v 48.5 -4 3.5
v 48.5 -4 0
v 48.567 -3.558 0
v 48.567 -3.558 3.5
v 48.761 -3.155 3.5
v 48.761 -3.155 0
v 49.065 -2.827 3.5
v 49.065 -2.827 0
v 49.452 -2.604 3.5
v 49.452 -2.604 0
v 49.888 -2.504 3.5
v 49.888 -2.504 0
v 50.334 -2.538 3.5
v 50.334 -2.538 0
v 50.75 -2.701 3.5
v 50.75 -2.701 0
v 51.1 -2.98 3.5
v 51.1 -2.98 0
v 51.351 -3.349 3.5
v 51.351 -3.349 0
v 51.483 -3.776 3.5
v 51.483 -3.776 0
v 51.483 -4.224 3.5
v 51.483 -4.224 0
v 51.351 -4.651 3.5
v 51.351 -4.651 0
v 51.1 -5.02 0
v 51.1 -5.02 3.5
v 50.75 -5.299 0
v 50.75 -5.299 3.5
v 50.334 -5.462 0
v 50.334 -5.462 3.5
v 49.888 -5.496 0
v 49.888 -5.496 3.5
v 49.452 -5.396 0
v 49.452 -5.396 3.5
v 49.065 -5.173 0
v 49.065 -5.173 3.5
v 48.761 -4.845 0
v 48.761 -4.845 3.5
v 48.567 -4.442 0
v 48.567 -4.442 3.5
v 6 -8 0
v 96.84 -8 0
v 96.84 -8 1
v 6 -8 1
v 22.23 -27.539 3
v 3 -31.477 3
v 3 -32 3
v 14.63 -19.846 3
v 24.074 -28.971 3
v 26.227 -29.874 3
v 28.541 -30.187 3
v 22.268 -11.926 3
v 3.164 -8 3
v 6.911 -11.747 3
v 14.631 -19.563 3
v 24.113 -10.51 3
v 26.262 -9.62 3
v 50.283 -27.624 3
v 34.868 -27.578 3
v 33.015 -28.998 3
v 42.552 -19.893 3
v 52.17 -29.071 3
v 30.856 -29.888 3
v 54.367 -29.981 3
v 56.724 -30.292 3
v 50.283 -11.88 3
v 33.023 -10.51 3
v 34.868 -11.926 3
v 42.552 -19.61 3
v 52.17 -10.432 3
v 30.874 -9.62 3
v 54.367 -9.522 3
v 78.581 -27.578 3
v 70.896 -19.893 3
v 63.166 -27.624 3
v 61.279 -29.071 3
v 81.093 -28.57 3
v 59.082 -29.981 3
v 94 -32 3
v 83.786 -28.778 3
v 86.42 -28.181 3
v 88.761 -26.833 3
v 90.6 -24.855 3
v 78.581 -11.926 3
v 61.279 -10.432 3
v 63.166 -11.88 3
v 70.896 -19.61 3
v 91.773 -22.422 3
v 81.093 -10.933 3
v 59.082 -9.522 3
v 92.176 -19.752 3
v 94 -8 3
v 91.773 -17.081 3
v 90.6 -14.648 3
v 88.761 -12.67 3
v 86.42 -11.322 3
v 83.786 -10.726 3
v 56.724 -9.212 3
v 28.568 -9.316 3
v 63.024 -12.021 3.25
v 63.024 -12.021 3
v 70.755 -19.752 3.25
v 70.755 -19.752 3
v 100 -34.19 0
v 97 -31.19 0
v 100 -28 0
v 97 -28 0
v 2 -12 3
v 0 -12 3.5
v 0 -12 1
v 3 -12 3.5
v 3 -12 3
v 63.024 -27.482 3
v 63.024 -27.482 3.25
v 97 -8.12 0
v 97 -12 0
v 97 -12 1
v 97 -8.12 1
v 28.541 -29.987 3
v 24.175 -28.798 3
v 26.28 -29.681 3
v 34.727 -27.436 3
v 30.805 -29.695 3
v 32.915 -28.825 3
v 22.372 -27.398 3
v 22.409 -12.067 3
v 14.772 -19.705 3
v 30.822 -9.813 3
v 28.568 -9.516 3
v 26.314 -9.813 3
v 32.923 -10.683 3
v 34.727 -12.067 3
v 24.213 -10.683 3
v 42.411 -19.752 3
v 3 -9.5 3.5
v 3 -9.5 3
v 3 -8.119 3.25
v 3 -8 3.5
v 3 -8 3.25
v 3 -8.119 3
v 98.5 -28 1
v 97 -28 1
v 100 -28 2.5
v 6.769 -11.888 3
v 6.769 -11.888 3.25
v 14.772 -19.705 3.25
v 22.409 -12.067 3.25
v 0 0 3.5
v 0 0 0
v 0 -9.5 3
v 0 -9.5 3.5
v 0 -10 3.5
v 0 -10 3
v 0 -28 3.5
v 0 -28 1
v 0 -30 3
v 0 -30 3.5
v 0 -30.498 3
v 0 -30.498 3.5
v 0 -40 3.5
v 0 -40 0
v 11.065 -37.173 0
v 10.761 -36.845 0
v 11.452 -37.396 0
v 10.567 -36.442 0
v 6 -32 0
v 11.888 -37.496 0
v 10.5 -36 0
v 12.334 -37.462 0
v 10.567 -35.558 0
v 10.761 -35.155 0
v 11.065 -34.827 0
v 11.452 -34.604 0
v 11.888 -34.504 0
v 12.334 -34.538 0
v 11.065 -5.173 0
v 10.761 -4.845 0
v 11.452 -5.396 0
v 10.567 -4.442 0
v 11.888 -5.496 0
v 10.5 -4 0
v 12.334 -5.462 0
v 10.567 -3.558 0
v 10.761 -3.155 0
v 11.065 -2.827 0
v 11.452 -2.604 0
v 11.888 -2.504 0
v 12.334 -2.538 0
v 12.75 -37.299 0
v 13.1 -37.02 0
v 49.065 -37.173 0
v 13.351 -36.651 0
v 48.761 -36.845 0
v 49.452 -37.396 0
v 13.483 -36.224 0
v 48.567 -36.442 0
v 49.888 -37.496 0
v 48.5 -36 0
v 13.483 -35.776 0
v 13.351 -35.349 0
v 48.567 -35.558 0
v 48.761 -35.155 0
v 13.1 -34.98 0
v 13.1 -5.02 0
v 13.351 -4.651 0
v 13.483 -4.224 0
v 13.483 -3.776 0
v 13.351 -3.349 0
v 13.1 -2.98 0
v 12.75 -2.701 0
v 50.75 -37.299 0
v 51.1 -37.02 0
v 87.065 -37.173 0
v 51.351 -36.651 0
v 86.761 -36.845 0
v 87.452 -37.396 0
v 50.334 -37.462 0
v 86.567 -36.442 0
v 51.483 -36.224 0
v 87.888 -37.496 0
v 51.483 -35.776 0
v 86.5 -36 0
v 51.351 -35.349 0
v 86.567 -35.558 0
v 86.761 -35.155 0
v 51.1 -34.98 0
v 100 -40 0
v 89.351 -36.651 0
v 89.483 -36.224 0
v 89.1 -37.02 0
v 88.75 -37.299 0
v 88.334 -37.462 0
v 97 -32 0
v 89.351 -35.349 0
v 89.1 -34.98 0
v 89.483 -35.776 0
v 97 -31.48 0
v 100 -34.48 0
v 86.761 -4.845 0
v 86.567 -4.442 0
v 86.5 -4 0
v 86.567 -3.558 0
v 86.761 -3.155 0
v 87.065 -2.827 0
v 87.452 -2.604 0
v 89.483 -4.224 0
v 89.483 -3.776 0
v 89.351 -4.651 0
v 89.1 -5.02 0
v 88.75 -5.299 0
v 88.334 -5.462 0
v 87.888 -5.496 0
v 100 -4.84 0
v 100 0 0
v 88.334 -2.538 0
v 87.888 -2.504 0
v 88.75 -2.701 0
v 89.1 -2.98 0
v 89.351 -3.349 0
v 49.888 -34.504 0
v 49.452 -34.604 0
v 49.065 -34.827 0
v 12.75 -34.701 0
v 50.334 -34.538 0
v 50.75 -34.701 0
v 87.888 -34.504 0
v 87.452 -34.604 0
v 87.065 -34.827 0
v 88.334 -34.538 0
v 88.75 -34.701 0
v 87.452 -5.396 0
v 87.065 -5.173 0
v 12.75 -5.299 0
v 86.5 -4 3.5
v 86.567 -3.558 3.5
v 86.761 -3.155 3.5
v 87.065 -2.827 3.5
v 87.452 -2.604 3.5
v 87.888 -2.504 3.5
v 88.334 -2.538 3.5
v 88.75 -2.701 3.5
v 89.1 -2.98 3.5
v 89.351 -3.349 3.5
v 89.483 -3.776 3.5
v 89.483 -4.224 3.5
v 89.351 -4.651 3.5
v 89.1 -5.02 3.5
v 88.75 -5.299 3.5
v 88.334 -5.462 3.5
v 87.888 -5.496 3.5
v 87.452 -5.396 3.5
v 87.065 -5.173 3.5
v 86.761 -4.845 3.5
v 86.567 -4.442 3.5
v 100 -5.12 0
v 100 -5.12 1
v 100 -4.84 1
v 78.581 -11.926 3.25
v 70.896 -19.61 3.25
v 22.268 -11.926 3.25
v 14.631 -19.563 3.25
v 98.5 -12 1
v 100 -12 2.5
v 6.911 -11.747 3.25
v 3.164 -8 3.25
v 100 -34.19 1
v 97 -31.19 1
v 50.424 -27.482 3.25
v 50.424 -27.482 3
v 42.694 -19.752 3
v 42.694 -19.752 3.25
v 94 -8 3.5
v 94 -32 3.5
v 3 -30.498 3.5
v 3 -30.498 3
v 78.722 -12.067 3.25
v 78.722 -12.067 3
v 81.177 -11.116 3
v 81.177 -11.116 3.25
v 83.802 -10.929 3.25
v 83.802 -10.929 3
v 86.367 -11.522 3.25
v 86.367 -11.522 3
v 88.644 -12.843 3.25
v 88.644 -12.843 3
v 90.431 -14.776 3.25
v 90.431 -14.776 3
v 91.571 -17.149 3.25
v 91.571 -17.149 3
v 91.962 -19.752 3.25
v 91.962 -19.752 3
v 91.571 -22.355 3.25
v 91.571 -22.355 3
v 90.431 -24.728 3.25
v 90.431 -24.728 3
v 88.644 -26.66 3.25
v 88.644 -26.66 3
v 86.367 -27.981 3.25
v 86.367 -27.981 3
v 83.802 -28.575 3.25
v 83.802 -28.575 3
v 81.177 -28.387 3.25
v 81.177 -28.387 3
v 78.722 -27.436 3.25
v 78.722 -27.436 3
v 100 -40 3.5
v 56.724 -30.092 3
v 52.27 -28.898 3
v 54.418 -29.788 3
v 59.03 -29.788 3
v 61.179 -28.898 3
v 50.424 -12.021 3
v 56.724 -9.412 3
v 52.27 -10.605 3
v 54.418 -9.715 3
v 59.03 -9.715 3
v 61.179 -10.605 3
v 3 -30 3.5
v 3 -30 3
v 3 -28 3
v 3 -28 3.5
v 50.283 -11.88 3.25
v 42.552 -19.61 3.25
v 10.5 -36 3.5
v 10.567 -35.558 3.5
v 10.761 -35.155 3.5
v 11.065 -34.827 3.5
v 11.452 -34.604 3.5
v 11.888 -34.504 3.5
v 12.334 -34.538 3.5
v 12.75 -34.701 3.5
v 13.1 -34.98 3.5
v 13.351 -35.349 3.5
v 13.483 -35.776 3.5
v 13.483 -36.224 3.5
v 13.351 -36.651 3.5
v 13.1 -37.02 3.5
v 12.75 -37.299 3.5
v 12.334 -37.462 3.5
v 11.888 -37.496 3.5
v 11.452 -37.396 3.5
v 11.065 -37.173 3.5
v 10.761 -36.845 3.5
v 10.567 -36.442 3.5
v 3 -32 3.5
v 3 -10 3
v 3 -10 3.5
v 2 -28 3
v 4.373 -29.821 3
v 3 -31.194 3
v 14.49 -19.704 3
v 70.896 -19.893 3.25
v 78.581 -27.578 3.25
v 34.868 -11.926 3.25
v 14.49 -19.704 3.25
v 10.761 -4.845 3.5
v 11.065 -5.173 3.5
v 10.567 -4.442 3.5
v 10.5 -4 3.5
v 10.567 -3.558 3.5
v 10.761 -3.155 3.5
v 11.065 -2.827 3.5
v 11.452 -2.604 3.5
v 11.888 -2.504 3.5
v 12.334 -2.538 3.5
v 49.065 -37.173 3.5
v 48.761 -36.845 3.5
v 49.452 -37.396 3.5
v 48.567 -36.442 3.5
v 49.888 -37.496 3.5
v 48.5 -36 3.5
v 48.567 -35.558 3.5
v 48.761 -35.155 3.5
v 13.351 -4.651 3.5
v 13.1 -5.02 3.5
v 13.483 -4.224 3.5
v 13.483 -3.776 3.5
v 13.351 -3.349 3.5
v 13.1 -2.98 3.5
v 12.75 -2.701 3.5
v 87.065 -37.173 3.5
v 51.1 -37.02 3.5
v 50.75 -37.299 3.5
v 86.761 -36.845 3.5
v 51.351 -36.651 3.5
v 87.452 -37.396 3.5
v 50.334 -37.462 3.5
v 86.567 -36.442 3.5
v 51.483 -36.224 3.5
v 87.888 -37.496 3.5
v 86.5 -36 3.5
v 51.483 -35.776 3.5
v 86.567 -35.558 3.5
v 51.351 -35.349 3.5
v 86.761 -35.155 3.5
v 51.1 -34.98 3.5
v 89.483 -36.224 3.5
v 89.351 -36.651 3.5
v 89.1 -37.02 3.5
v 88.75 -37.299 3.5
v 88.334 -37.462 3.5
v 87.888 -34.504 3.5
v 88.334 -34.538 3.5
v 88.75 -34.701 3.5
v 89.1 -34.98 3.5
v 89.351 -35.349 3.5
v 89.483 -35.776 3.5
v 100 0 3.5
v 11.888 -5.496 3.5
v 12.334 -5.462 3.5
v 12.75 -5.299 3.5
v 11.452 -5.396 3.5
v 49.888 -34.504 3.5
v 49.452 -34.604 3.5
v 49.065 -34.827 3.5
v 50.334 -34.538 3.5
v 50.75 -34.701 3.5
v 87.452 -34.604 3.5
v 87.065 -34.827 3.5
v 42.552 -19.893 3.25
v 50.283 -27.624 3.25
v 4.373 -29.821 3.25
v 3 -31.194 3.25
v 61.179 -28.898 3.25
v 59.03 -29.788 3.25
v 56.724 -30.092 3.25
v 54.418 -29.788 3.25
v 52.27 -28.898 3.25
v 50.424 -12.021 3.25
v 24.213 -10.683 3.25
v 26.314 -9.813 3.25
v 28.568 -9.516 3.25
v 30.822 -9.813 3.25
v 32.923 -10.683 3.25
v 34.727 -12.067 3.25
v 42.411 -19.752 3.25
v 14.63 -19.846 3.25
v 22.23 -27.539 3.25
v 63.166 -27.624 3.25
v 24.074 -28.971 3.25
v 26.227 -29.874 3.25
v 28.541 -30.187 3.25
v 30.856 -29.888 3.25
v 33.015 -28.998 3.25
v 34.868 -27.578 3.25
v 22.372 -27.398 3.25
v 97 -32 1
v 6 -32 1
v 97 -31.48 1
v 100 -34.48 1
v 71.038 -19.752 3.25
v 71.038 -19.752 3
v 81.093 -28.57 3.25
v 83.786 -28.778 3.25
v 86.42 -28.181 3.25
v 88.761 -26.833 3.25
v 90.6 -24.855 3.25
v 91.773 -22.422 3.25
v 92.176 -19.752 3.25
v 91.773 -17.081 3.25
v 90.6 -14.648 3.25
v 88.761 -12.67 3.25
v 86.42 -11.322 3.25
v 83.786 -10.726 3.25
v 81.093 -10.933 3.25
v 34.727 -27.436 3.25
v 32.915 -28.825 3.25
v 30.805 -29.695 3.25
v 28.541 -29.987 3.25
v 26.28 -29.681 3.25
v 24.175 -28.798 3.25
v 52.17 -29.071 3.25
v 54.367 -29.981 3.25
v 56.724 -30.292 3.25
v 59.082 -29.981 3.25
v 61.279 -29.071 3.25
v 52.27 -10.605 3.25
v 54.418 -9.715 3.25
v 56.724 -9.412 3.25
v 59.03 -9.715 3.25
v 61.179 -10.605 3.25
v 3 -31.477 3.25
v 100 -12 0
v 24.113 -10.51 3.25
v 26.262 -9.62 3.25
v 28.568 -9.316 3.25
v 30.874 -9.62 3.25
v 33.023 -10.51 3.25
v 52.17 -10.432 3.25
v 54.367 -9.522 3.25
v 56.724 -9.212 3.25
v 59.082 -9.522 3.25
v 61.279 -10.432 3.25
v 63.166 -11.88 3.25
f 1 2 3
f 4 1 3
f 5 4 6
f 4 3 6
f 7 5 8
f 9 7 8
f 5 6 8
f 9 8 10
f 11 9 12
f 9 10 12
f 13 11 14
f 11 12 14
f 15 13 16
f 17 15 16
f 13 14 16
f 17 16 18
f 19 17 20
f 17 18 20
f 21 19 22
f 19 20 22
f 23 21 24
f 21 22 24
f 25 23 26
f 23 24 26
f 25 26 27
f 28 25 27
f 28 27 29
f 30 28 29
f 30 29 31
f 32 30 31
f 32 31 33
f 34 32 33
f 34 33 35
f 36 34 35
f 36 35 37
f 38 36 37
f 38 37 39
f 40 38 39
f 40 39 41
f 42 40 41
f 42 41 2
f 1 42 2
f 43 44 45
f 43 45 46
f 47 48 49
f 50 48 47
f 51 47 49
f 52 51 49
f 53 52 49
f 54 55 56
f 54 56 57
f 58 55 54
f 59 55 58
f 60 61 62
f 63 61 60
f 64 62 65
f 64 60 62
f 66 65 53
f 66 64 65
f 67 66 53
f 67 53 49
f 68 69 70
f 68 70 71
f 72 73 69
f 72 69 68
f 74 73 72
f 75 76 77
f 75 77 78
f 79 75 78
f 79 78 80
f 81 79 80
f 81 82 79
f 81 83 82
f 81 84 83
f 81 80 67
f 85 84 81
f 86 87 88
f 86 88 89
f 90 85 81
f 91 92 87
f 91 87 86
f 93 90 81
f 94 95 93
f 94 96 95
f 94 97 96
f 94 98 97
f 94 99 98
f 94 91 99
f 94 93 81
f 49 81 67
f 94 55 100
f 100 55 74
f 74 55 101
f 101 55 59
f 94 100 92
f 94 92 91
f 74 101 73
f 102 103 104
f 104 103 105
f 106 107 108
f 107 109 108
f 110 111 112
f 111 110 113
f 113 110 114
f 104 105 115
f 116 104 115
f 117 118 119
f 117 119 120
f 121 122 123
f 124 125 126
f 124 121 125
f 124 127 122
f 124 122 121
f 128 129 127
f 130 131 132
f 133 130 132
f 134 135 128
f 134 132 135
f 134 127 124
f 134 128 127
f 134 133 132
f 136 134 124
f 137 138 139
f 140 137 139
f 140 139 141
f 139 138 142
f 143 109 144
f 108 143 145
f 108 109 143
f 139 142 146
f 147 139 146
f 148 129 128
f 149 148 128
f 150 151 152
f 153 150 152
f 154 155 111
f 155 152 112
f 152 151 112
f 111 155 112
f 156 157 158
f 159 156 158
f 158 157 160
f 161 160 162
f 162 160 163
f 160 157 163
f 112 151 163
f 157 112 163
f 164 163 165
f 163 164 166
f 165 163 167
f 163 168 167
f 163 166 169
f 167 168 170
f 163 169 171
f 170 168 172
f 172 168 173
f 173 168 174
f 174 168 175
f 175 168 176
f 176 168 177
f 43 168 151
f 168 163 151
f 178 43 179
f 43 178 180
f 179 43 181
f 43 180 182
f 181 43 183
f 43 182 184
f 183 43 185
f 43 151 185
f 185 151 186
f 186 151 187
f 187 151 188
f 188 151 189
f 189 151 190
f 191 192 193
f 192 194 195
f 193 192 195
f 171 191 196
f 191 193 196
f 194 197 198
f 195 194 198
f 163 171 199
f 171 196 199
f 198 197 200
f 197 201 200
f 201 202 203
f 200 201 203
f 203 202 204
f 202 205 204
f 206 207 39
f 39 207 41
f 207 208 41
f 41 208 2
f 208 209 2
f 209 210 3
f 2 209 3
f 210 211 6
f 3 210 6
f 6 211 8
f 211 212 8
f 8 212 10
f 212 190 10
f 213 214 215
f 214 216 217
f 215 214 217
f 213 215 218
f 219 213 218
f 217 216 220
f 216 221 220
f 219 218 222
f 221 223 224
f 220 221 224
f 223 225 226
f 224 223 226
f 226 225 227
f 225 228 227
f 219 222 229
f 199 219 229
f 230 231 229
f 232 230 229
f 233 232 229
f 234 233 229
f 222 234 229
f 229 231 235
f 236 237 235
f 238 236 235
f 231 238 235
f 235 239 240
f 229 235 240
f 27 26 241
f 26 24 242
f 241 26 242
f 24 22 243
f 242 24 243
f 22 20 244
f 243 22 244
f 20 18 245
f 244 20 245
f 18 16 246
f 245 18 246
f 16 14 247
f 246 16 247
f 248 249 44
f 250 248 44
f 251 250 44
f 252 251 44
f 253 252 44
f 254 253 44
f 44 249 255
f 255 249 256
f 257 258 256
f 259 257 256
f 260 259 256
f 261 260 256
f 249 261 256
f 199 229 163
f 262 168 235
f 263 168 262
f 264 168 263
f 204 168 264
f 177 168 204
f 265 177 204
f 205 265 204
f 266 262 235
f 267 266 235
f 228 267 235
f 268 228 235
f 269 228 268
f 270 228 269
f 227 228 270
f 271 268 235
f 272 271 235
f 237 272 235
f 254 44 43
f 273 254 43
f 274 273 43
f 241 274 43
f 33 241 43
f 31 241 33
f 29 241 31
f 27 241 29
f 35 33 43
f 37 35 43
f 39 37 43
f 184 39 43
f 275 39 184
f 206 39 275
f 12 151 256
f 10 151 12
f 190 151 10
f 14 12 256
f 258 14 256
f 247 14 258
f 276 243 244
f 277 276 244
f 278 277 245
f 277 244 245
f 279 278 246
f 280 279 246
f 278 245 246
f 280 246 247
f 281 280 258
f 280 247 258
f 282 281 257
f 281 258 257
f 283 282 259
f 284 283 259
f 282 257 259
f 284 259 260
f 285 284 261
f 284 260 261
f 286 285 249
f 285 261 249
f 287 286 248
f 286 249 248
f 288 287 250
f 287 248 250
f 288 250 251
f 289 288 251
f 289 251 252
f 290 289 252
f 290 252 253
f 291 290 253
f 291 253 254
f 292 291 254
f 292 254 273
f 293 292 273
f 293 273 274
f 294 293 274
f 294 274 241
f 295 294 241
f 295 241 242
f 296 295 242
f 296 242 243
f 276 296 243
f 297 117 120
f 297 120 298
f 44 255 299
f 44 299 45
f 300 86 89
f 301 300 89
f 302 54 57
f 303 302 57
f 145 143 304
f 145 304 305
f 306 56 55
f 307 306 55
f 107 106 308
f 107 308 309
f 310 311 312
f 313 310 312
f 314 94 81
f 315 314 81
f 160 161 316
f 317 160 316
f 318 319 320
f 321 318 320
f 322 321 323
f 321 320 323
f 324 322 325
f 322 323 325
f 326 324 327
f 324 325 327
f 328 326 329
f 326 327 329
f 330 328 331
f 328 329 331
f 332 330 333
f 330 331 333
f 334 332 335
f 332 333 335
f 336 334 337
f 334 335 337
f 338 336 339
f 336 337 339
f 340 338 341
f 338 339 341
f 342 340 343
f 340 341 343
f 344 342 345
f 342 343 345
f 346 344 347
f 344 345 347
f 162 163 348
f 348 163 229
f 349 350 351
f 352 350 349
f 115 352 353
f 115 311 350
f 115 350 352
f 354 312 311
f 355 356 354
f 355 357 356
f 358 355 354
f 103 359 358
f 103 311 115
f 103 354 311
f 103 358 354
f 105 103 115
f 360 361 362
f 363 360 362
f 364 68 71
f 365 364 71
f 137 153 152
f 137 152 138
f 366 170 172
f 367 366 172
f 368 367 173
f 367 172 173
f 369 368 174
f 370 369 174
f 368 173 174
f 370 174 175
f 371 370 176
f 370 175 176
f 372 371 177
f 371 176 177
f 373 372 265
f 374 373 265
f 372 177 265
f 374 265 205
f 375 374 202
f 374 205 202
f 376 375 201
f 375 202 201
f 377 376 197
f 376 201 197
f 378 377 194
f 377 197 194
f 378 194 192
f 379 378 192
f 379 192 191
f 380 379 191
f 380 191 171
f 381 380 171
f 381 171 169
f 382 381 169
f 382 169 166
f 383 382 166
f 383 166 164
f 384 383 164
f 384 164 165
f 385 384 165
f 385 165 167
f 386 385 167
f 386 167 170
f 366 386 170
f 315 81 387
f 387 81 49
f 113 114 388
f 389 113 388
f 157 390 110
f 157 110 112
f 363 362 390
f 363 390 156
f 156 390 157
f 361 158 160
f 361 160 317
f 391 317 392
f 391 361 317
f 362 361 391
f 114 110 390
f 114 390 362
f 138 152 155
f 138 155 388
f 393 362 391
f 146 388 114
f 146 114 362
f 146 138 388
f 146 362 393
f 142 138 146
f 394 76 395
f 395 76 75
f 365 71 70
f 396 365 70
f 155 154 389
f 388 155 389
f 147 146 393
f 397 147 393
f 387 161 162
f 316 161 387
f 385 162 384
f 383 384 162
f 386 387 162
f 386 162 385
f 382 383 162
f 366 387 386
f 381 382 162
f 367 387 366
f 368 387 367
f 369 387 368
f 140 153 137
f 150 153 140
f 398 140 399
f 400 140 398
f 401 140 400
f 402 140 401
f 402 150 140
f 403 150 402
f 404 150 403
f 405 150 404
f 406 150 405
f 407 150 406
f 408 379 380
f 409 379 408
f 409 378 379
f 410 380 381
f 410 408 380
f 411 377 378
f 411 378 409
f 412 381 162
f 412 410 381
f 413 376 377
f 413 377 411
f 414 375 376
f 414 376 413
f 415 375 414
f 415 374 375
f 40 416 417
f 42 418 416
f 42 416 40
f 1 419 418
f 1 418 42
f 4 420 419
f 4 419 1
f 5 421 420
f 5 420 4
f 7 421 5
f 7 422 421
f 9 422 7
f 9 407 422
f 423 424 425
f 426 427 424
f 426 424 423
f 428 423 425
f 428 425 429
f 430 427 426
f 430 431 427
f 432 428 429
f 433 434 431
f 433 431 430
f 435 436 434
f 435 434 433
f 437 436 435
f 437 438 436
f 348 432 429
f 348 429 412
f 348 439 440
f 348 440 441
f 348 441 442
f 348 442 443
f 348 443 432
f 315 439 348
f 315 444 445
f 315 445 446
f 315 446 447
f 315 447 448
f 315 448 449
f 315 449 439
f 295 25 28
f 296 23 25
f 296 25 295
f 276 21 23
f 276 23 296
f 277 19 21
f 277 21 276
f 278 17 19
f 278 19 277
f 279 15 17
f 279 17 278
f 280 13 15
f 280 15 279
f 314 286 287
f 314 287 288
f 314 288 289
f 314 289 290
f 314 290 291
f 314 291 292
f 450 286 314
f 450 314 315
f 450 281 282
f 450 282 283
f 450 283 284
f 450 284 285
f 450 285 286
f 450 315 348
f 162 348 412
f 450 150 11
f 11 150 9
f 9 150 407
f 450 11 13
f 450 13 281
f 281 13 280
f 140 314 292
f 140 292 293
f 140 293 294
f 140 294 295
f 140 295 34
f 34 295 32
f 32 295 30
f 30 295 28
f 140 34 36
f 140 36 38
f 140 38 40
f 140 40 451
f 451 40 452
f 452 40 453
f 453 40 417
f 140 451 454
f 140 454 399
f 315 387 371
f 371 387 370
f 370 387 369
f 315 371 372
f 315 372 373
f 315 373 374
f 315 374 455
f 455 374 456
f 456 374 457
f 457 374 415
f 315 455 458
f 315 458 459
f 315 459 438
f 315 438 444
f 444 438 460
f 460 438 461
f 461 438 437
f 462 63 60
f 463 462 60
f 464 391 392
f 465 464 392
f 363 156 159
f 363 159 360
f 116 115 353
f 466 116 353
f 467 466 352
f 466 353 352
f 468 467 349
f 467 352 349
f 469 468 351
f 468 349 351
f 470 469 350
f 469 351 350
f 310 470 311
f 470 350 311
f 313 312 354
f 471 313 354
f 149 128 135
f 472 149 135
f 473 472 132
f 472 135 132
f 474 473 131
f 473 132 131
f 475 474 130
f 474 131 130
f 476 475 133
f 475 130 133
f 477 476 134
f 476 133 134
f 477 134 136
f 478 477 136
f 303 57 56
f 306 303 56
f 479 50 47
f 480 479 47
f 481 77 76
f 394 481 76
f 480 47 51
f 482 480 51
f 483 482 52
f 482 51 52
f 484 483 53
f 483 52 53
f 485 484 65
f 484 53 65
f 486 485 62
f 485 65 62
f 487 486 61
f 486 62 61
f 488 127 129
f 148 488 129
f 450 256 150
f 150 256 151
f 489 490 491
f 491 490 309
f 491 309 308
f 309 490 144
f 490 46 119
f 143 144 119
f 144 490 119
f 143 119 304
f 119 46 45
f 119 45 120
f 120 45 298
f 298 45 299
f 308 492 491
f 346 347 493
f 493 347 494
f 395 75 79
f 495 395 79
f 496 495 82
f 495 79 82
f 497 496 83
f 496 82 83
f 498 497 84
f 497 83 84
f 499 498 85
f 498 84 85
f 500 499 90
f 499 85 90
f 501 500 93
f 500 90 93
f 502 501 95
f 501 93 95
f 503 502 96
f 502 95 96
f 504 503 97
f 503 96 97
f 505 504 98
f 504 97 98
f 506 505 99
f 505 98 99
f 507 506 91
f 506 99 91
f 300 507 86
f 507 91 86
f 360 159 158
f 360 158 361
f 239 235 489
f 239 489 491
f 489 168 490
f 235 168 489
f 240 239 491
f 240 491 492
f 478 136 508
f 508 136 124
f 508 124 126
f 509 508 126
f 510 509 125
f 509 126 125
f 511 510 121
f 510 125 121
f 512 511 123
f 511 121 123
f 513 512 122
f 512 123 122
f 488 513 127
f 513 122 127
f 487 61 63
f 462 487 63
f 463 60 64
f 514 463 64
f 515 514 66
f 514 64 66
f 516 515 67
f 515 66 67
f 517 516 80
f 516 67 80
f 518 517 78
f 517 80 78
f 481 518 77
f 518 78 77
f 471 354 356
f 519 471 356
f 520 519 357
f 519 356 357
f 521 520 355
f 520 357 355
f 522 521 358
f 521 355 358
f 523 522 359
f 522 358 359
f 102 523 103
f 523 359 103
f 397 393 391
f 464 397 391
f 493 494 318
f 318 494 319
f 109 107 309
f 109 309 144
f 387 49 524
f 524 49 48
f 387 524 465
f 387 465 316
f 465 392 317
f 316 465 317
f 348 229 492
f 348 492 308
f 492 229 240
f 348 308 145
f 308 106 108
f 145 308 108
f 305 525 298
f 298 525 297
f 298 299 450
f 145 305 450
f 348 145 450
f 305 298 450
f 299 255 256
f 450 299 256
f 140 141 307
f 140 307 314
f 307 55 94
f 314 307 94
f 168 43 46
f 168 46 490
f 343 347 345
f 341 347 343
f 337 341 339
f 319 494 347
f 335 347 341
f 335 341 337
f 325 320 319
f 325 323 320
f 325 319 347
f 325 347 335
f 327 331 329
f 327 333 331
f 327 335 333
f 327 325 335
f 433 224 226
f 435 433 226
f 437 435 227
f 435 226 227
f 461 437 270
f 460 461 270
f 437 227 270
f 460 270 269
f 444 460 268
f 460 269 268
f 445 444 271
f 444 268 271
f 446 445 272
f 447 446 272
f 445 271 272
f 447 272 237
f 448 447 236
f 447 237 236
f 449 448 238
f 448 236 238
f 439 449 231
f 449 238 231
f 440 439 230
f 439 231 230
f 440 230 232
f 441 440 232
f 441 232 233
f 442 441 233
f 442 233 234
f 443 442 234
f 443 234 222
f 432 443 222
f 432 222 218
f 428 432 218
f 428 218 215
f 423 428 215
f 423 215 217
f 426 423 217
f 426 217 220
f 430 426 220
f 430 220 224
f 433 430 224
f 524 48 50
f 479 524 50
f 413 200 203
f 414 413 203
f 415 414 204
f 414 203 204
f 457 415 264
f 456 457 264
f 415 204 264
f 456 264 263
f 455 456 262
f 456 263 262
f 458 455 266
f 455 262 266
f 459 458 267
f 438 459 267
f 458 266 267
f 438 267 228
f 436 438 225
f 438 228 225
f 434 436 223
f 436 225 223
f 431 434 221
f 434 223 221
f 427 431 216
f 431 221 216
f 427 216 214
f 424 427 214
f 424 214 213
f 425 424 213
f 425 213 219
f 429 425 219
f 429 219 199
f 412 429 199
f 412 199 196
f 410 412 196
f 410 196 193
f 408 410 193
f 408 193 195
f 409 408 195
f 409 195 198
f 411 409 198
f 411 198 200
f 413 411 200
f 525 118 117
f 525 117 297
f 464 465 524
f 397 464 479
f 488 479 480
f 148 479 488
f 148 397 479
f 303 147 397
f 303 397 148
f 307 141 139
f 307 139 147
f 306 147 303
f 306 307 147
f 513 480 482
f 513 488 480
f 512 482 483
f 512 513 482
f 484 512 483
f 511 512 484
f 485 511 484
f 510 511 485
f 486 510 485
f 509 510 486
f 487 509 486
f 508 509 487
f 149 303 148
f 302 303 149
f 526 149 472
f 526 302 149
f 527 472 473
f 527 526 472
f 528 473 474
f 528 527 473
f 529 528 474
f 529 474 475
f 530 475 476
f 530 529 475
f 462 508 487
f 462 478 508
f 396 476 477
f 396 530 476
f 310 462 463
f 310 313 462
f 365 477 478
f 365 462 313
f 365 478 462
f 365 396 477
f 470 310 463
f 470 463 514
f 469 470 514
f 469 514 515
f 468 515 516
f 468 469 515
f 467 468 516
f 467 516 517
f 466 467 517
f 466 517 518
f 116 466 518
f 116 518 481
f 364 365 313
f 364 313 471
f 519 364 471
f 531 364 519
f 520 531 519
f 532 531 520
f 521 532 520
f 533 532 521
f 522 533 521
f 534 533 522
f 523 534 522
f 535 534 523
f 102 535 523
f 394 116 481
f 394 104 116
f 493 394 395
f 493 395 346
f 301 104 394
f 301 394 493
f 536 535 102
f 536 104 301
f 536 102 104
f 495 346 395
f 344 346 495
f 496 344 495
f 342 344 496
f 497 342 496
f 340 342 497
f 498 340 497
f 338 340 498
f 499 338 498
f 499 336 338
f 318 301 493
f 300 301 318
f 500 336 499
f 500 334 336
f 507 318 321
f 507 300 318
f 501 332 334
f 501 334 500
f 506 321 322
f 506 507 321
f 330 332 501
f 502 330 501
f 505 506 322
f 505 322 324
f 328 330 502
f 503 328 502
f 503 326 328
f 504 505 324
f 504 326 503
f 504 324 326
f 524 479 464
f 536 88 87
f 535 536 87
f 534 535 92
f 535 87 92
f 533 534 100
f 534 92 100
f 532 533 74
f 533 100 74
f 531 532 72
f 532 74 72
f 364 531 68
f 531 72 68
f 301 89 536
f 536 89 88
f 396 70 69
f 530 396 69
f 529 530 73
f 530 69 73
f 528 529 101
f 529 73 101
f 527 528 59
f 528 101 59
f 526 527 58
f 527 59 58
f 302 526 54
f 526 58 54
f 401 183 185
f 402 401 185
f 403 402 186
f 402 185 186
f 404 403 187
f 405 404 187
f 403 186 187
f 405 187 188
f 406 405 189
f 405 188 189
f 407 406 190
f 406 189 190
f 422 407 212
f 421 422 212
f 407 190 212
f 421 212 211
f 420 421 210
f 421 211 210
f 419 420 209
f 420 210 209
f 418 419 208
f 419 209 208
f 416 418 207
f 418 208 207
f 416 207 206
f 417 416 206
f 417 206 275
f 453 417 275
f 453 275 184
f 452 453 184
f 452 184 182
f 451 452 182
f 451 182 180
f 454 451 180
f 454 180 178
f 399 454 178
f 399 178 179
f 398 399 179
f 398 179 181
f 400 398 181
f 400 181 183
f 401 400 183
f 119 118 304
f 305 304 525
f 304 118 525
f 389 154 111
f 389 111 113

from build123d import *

# Parameters (mm, degrees)
SKETCH1_W             = 100
SKETCH1_H             = 40
BOSS_EXTRUDE1_DEPTH   = 3
BOSS_EXTRUDE2_DEPTH   = 0.25
BOSS_EXTRUDE21_DEPTH  = 0.5
CUT_EXTRUDE51_DEPTH   = 1
F_3_0MM_DOWEL_HOLE1_D = 3
CUT_EXTRUDE52_START   = -12
CUT_EXTRUDE52_DEPTH   = 16
SKETCH38_W            = 3
SKETCH38_H            = 0.5
SKETCH38_H_2          = 0.498463084
CUT_EXTRUDE53_DEPTH   = 0.5


with BuildPart() as part:
    # Sketch1 → Boss-Extrude1 (new body)
    with BuildSketch(Plane.XY):
        with Locations((50, -20)):
            Rectangle(SKETCH1_W, SKETCH1_H)
    extrude(amount=BOSS_EXTRUDE1_DEPTH)



with BuildPart() as body_2:
    # Sketch15 → Boss-Extrude2 (new body)
    with BuildSketch(Plane.XY.offset(3)):
        with BuildLine():
            Line((6.768599112, -11.887878533), (14.489844294, -19.704001121))
            Line((14.489844294, -19.704001121), (4.37258998, -29.821255436))
            Line((4.37258998, -29.821255436), (3, -31.193845416))
            Line((3, -31.193845416), (3, -31.476688128))
            Line((3, -31.476688128), (4.514011336, -29.962676792))
            Line((4.514011336, -29.962676792), (14.630402075, -19.846286053))
            Line((14.630402075, -19.846286053), (22.229666729, -27.538929237))
            ThreePointArc((22.229666729, -27.538929237), (28.540816637, -30.187020221), (34.868018887, -27.577516304))
            Line((34.868018887, -27.577516304), (42.552442419, -19.893092772))
            Line((42.552442419, -19.893092772), (50.282946717, -27.623597071))
            ThreePointArc((50.282946717, -27.623597071), (56.724368073, -30.291721157), (63.16578943, -27.623597071))
            Line((63.16578943, -27.623597071), (70.896293728, -19.893092772))
            Line((70.896293728, -19.893092772), (78.58071726, -27.577516304))
            ThreePointArc((78.58071726, -27.577516304), (92.175896221, -19.751671416), (78.58071726, -11.925826528))
            Line((78.58071726, -11.925826528), (70.896293728, -19.61025006))
            Line((70.896293728, -19.61025006), (63.16578943, -11.879745762))
            ThreePointArc((63.16578943, -11.879745762), (56.724368073, -9.211621675), (50.282946717, -11.879745762))
            Line((50.282946717, -11.879745762), (42.552442419, -19.61025006))
            Line((42.552442419, -19.61025006), (34.868018887, -11.925826528))
            ThreePointArc((34.868018887, -11.925826528), (28.568018887, -9.316281085), (22.268018887, -11.925826528))
            Line((22.268018887, -11.925826528), (14.631268287, -19.562577129))
            Line((14.631268287, -19.562577129), (6.910881392, -11.747323373))
            Line((6.910881392, -11.747323373), (3.163558019, -8))
            Line((3.163558019, -8), (3, -8))
            Line((3, -8), (3, -8.119279421))
            Line((3, -8.119279421), (6.768599112, -11.887878533))
        make_face()
        with BuildLine():
            Line((22.371949008, -27.398374077), (14.771826068, -19.70486206))
            Line((14.771826068, -19.70486206), (22.409440244, -12.067247885))
            ThreePointArc((22.409440244, -12.067247885), (28.568018887, -9.516281085), (34.726597531, -12.067247885))
            Line((34.726597531, -12.067247885), (42.411021063, -19.751671416))
            Line((42.411021063, -19.751671416), (34.726597531, -27.436094948))
            ThreePointArc((34.726597531, -27.436094948), (28.541427268, -29.987021153), (22.371949008, -27.398374077))
        make_face(mode=Mode.SUBTRACT)
        with BuildLine():
            Line((70.754872372, -19.751671416), (63.024368073, -27.482175714))
            ThreePointArc((63.024368073, -27.482175714), (56.724368073, -30.091721157), (50.424368073, -27.482175714))
            Line((50.424368073, -27.482175714), (42.693863775, -19.751671416))
            Line((42.693863775, -19.751671416), (50.424368073, -12.021167118))
            ThreePointArc((50.424368073, -12.021167118), (56.724368073, -9.411621675), (63.024368073, -12.021167118))
            Line((63.024368073, -12.021167118), (70.754872372, -19.751671416))
        make_face(mode=Mode.SUBTRACT)
        with BuildLine():
            Line((71.037715084, -19.751671416), (78.722138616, -12.067247885))
            ThreePointArc((78.722138616, -12.067247885), (91.962142601, -19.751671416), (78.722138616, -27.436094948))
            Line((78.722138616, -27.436094948), (71.037715084, -19.751671416))
        make_face(mode=Mode.SUBTRACT)
    extrude(amount=BOSS_EXTRUDE2_DEPTH)


with BuildPart() as part_1:
    add(part.part)

    add(body_2.part)  # Boss-Extrude21 merges body 2
    # Sketch15<71> → Boss-Extrude21 (add)
    with BuildSketch(Plane.XY.offset(3)):
        Polygon((3, -31.476688128), (3, -31.193845416), (3, -28), (0, -28), (0, -40), (100, -40), (100, 0), (0, 0), (0, -12), (3, -12), (3, -8.119279421), (3, -8), (3.163558019, -8), (94, -8), (94, -32), (3, -32), align=None)
    extrude(amount=BOSS_EXTRUDE21_DEPTH)

    # Sketch16 → Cut-Extrude51 (cut)
    with BuildSketch(Plane.XY):
        Polygon((96.84, -8), (6, -8), (6, -32), (97, -32), (97, -31.48), (100, -34.48), (100, -34.19), (97, -31.19), (97, -28), (100, -28), (100, -12), (97, -12), (97, -8.12), (100, -5.12), (100, -4.84), align=None)
    extrude(amount=CUT_EXTRUDE51_DEPTH, mode=Mode.SUBTRACT)

    # Ø3.0mm Dowel Hole1 (through all)
    with Locations(Plane.XY.offset(3.5)):
        with Locations((12, -4), (50, -4), (88, -4), (88, -36), (50, -36), (12, -36)):
            Hole(F_3_0MM_DOWEL_HOLE1_D / 2)

    # Sketch37 → Cut-Extrude52 (cut)
    with BuildSketch(Plane(origin=(0, -40, 0), x_dir=(-1, 0, 0), z_dir=(0, -1, 0)).offset(CUT_EXTRUDE52_START)):
        Polygon((0, -3.5), (-2.5, -3.5), (0, -1), align=None)
        Polygon((-100, 0), (-97.5, 0), (-100, -2.5), align=None)
    extrude(amount=-CUT_EXTRUDE52_DEPTH, mode=Mode.SUBTRACT)

    # Sketch38 → Cut-Extrude53 (cut)
    with BuildSketch(Plane.XY.offset(3.5)):
        with Locations((1.5, -9.75)):
            Rectangle(SKETCH38_W, SKETCH38_H)
        with Locations((1.5, -30.249231542)):
            Rectangle(SKETCH38_W, SKETCH38_H_2)
    extrude(amount=-CUT_EXTRUDE53_DEPTH, mode=Mode.SUBTRACT)


solid = part_1.part
